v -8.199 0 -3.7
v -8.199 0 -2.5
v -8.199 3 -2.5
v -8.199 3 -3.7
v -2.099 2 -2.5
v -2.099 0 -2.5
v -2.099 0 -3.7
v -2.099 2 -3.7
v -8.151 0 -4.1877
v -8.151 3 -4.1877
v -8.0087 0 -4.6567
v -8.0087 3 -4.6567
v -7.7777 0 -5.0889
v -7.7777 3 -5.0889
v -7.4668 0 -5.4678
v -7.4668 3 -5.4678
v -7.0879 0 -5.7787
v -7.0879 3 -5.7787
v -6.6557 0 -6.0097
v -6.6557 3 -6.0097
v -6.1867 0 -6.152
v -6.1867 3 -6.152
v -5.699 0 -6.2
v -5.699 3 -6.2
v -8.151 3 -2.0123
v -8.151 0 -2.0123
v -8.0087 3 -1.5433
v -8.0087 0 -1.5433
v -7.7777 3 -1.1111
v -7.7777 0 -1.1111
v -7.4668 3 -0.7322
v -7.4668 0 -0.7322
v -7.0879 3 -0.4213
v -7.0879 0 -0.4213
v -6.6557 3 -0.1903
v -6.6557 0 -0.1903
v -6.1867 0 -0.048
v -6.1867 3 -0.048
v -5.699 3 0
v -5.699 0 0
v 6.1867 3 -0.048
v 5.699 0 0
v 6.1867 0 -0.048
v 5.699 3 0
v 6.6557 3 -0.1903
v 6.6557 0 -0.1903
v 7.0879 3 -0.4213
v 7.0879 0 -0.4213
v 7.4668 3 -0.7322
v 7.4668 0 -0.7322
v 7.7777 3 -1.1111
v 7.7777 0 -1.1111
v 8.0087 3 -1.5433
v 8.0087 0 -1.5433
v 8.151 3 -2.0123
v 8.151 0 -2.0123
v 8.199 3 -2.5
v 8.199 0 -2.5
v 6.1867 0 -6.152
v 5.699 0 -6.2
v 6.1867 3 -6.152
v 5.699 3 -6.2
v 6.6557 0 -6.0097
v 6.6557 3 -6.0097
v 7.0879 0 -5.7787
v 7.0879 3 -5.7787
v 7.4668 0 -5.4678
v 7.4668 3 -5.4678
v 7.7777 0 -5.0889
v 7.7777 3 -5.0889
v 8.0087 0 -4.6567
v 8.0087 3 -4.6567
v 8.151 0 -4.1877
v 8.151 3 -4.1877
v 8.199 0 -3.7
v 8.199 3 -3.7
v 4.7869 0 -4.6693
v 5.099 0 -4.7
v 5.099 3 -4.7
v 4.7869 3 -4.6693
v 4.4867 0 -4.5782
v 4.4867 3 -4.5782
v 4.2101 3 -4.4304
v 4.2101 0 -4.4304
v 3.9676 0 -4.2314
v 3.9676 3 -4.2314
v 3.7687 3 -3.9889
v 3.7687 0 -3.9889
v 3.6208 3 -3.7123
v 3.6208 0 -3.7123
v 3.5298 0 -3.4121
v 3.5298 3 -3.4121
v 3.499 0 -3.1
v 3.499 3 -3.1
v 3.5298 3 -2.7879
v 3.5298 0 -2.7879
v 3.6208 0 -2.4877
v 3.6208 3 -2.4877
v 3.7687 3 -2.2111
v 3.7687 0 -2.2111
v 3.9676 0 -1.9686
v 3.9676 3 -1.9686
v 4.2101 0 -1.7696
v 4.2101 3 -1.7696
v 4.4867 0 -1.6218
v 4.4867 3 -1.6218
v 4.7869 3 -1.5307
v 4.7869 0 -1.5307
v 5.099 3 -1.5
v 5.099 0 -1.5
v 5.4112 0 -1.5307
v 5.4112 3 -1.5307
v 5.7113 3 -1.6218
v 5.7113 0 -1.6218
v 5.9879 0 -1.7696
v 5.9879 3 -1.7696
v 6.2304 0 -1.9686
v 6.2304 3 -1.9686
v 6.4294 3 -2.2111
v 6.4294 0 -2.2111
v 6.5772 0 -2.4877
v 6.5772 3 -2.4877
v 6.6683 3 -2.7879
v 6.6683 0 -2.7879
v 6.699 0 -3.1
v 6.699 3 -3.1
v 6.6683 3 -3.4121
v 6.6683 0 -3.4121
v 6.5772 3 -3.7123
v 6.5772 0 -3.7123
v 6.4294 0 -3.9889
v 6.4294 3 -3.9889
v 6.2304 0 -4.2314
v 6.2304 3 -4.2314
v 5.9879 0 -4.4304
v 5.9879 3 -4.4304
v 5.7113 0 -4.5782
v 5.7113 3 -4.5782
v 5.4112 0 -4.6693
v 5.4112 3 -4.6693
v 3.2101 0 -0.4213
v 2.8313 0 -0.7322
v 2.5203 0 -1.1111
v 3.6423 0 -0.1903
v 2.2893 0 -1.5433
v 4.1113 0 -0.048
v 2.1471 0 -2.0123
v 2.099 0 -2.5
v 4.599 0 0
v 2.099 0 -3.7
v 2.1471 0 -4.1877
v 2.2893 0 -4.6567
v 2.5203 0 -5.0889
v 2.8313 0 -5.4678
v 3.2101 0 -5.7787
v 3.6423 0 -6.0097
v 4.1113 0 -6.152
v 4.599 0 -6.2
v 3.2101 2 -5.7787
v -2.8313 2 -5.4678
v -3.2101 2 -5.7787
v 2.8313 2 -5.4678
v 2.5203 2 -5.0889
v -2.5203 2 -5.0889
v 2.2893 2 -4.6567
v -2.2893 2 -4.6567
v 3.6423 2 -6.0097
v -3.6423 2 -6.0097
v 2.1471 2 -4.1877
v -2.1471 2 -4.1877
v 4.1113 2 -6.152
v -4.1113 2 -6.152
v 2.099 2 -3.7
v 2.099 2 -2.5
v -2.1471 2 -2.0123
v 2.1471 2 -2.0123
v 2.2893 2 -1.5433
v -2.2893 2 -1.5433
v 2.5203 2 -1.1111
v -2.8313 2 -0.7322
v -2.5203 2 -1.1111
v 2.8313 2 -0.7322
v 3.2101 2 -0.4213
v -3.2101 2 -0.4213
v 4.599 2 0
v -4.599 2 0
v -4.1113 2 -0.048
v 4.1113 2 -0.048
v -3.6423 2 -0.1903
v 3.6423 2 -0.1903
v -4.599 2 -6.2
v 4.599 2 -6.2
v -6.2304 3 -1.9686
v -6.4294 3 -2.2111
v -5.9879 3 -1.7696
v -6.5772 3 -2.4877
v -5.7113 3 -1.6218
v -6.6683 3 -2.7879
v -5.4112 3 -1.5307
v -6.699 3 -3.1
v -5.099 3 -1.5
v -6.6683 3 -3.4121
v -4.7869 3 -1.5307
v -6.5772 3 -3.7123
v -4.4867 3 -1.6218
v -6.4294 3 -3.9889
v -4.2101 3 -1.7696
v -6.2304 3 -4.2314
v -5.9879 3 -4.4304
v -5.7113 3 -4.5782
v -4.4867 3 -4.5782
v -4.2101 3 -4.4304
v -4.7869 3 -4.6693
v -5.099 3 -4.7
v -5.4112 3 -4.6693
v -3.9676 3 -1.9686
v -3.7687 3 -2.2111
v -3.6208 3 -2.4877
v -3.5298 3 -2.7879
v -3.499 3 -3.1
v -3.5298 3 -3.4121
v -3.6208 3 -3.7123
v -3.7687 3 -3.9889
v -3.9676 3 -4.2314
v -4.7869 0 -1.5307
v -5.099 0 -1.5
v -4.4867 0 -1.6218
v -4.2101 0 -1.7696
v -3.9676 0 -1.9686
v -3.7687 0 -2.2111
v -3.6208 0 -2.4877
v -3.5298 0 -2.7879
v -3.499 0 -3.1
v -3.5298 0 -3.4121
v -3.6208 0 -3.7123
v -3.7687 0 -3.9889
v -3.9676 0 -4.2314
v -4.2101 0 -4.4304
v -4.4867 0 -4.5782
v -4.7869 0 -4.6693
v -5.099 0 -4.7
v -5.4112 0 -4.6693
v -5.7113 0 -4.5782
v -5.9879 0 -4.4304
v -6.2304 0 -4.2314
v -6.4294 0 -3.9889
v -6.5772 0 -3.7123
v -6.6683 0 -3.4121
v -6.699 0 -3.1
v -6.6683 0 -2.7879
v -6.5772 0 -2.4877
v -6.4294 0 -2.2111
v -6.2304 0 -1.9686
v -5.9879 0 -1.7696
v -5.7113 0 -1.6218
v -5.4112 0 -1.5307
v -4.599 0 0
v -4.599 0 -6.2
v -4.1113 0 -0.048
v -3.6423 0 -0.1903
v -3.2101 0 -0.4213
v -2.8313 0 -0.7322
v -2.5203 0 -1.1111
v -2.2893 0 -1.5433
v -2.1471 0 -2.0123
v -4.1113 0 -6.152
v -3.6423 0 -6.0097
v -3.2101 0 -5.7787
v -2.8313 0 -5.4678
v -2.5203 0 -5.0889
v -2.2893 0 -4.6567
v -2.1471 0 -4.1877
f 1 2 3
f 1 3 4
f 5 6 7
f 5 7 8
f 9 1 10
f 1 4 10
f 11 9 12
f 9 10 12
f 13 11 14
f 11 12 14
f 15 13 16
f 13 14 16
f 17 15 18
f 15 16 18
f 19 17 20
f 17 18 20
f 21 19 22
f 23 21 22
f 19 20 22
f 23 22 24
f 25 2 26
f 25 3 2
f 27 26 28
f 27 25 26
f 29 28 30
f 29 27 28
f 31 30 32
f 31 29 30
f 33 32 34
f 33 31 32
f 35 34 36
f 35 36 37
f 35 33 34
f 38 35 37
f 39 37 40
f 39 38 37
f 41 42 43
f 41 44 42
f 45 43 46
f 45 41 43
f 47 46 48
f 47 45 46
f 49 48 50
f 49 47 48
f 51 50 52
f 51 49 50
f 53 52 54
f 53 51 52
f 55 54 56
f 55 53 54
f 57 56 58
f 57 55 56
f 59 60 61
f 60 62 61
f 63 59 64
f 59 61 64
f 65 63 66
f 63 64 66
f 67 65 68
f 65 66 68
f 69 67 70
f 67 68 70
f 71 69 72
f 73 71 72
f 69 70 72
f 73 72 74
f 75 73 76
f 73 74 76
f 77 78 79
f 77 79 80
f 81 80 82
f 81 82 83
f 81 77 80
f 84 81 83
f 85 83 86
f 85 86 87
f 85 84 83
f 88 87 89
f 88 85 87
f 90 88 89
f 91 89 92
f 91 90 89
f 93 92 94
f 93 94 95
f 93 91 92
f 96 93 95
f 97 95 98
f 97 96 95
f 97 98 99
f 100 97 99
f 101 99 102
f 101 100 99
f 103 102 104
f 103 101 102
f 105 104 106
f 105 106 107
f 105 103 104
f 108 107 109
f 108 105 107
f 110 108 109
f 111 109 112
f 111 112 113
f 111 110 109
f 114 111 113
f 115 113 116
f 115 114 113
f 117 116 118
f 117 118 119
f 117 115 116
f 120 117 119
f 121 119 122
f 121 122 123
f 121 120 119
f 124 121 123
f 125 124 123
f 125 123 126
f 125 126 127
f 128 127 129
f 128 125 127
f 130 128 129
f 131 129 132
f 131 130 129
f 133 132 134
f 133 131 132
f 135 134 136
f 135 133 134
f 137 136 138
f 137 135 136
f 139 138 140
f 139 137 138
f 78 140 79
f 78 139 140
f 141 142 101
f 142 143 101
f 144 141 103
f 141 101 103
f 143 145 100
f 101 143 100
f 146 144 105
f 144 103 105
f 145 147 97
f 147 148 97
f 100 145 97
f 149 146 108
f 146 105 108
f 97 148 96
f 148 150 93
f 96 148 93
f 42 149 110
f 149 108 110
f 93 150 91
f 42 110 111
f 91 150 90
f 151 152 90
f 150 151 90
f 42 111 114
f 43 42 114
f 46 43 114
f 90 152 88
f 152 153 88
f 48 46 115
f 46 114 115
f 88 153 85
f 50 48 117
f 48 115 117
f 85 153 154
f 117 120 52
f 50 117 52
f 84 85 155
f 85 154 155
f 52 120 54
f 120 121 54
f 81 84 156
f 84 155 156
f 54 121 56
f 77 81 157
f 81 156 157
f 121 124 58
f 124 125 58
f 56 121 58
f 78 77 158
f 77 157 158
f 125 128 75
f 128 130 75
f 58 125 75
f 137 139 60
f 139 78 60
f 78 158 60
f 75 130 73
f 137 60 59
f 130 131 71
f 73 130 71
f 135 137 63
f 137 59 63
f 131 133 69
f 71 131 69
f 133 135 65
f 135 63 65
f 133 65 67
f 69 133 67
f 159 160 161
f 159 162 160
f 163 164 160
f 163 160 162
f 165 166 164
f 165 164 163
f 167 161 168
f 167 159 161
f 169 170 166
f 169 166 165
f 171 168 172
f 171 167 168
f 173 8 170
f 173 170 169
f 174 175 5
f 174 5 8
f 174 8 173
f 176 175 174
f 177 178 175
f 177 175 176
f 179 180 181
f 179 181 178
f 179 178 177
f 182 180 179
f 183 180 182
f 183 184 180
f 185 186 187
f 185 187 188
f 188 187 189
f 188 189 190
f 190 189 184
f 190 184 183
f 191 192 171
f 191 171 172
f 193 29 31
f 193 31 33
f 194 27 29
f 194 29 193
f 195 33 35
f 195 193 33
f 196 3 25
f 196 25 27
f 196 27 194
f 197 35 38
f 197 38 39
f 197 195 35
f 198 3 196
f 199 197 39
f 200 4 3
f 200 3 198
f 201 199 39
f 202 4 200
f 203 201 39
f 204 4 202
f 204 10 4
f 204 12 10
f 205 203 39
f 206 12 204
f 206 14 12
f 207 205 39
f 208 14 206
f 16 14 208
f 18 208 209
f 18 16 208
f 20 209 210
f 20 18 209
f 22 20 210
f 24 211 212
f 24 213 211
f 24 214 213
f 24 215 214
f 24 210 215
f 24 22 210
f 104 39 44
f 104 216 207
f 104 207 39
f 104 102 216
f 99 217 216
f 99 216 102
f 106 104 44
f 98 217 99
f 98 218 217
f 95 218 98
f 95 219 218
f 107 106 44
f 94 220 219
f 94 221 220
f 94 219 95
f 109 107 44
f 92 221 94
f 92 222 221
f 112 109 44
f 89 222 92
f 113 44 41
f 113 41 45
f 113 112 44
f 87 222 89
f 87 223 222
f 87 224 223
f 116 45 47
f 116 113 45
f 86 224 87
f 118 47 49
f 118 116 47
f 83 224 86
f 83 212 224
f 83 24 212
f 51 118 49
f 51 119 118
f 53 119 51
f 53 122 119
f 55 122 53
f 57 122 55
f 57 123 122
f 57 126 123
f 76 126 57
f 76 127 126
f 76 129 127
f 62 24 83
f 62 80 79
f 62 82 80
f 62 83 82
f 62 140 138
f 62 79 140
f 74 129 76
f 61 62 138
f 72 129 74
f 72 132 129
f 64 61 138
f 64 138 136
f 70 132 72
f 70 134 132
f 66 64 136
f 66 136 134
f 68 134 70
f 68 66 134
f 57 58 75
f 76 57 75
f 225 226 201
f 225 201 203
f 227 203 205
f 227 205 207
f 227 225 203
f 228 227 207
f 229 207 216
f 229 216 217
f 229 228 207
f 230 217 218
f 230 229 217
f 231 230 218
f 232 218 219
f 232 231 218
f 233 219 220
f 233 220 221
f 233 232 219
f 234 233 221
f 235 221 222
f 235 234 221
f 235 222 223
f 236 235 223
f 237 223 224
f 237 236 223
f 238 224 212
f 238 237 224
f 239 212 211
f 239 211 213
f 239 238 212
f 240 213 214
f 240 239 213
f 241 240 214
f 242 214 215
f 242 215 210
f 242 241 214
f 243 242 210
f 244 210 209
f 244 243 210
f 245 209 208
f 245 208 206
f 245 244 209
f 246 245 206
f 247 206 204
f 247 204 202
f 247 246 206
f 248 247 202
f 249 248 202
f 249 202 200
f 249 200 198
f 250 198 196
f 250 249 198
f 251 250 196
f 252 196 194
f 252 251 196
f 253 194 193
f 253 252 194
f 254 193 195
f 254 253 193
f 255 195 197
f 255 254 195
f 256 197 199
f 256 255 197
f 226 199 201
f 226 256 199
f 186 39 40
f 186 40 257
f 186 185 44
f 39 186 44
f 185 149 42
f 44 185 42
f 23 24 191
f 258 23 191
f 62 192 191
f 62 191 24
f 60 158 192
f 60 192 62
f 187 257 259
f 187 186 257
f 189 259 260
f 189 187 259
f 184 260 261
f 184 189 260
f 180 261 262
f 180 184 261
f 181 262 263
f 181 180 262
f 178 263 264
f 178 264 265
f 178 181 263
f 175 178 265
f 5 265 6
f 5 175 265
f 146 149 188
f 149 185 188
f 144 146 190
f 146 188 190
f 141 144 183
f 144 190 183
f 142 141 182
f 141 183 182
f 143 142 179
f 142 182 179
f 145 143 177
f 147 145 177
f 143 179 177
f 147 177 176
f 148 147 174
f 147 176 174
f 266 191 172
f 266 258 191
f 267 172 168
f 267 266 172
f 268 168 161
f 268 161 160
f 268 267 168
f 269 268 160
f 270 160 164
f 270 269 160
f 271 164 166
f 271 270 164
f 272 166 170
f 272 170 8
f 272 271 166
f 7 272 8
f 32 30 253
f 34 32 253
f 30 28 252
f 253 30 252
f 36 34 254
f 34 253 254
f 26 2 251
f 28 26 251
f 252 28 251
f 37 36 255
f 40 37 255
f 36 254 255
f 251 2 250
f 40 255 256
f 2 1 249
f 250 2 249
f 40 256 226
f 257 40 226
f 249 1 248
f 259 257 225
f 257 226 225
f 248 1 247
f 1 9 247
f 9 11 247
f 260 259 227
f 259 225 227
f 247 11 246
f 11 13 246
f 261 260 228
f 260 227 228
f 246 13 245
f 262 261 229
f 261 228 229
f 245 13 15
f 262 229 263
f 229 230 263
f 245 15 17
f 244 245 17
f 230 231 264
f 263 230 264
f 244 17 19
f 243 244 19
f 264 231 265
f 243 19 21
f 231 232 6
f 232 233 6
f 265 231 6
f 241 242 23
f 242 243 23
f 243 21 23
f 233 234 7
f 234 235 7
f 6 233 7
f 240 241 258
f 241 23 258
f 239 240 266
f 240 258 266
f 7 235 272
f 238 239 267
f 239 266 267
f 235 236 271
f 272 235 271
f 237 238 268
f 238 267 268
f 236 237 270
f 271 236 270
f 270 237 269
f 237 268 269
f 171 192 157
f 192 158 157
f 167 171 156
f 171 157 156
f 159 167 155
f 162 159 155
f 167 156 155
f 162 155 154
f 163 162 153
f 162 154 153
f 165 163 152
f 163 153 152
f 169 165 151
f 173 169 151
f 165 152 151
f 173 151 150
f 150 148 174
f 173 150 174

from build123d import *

# Parameters (mm, degrees)
SKETCH1_W           = 16.398039
SKETCH1_H           = 6.2
SKETCH1_R           = 1.6
BOSS_EXTRUDE1_DEPTH = 3
SKETCH5_W           = 4.198039
SKETCH5_H           = 2
CUT_EXTRUDE4_DEPTH  = 11.708124054
FILLET2_R           = 2.5


with BuildPart() as part:
    # Sketch1 → Boss-Extrude1 (new body)
    with BuildSketch(Plane(origin=(0, 0, 0), x_dir=(1, 0, 0), z_dir=(0, 1, 0))):
        with Locations((0, 3.1)):
            Rectangle(SKETCH1_W, SKETCH1_H)
        with Locations(Location((-5.0990195, 3.1, 0), (0, 0, 270))):
            Circle(SKETCH1_R, mode=Mode.SUBTRACT)
        with Locations(Location((5.0990195, 3.1, 0), (0, 0, 90))):
            Circle(SKETCH1_R, mode=Mode.SUBTRACT)
    extrude(amount=BOSS_EXTRUDE1_DEPTH)

    # Sketch5 → Cut-Extrude4 (cut, through all)
    with BuildSketch(Plane.XY):
        with Locations((0, 1)):
            Rectangle(SKETCH5_W, SKETCH5_H)
    extrude(amount=-CUT_EXTRUDE4_DEPTH, mode=Mode.SUBTRACT)

    # Fillet2
    fillet2_edges = [part.edges().sort_by_distance(p)[0] for p in [
        (-2.0990195, 1, -6.2),
        (2.0990195, 1, -6.2),
        (2.0990195, 1, 0),
        (-2.0990195, 1, 0),
        (-8.1990195, 1.5, -6.2),
        (8.1990195, 1.5, -6.2),
        (8.1990195, 1.5, 0),
        (-8.1990195, 1.5, 0),
    ]]
    fillet(fillet2_edges, radius=FILLET2_R)


solid = part.part
